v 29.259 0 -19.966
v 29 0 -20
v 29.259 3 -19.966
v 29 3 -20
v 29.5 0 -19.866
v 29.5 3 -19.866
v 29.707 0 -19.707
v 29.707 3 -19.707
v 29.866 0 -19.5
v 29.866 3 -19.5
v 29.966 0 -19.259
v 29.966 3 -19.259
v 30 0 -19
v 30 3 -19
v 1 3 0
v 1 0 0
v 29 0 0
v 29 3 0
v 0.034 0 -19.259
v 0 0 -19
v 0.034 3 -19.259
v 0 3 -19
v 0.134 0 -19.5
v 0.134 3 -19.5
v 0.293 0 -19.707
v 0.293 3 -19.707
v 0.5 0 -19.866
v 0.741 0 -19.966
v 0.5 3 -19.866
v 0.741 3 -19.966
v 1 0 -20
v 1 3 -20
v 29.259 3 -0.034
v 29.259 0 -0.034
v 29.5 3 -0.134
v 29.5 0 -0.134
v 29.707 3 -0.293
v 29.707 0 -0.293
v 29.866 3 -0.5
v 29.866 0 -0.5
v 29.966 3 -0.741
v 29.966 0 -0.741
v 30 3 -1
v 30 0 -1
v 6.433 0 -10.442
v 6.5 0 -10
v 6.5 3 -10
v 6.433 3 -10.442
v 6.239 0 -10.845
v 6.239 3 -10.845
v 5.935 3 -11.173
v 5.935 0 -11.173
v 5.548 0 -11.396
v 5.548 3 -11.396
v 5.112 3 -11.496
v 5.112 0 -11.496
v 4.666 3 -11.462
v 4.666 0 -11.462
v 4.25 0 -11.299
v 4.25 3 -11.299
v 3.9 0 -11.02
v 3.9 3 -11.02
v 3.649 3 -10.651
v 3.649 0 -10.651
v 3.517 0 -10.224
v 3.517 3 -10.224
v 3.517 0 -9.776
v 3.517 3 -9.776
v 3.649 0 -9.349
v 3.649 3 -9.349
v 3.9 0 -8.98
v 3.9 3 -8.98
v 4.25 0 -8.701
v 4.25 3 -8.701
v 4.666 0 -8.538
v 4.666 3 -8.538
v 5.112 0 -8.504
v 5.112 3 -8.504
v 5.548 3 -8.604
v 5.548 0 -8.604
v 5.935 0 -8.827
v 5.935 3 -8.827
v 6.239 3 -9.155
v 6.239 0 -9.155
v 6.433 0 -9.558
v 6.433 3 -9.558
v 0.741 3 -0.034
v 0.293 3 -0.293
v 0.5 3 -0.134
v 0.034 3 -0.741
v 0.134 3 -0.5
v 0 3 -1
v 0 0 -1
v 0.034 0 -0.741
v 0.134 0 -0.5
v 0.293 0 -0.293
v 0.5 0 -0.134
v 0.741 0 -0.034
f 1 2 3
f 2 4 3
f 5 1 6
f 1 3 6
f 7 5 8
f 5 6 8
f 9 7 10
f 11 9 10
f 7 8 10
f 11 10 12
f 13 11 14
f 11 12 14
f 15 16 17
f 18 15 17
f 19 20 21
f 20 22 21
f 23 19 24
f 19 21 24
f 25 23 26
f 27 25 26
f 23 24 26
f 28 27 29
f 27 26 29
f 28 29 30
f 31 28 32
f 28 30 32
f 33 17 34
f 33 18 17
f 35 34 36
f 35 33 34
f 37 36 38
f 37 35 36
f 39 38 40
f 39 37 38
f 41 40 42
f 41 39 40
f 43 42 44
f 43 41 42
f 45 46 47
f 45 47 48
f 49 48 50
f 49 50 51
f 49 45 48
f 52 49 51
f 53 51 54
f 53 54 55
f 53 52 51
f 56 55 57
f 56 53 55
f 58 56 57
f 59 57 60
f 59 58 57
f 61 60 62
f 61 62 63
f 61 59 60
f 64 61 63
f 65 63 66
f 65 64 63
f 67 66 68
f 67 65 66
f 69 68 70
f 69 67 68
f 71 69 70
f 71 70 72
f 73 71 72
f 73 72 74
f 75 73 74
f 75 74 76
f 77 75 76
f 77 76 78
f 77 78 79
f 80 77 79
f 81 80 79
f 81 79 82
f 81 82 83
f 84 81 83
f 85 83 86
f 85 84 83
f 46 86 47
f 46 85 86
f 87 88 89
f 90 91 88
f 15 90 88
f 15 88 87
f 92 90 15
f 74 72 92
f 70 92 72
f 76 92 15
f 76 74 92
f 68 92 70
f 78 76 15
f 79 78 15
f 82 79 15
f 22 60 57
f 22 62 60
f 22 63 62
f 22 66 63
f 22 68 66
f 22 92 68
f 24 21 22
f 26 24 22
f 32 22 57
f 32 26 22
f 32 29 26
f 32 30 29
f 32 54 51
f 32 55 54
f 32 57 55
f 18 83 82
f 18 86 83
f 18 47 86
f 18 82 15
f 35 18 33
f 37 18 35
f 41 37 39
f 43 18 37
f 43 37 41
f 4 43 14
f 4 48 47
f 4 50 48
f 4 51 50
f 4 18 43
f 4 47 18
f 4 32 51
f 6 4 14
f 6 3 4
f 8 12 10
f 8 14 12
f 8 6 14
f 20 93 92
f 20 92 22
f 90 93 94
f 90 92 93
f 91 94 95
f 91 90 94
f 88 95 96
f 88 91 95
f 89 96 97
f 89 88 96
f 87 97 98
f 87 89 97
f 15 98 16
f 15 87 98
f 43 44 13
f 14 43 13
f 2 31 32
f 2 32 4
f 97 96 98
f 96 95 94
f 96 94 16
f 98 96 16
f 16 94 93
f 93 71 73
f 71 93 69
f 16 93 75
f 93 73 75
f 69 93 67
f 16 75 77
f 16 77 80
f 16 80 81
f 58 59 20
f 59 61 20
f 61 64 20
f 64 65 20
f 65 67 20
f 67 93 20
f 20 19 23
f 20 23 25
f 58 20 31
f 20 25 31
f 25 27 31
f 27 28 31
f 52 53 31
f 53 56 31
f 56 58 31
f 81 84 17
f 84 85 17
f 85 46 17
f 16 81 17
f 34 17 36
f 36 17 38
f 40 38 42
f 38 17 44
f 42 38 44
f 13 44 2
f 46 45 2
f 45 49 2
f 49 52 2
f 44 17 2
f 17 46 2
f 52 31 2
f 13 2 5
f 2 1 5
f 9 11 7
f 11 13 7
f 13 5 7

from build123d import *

# Parameters (mm, degrees)
SKETCH1_W           = 30
SKETCH1_H           = 20
SKETCH1_R           = 1.5
BOSS_EXTRUDE1_DEPTH = 3
FILLET1_R           = 1


with BuildPart() as part:
    # Sketch1 → Boss-Extrude1 (new body)
    with BuildSketch(Plane(origin=(0, 0, 0), x_dir=(1, 0, 0), z_dir=(0, 1, 0))):
        with Locations((15, 10)):
            Rectangle(SKETCH1_W, SKETCH1_H)
        with Locations((5, 10)):
            Circle(SKETCH1_R, mode=Mode.SUBTRACT)
    extrude(amount=BOSS_EXTRUDE1_DEPTH)

    # Fillet1
    fillet1_edges = [part.edges().sort_by_distance(p)[0] for p in [
        (0, 1.5, -20),
        (30, 1.5, -20),
        (30, 1.5, 0),
        (0, 1.5, 0),
    ]]
    fillet(fillet1_edges, radius=FILLET1_R)


solid = part.part
